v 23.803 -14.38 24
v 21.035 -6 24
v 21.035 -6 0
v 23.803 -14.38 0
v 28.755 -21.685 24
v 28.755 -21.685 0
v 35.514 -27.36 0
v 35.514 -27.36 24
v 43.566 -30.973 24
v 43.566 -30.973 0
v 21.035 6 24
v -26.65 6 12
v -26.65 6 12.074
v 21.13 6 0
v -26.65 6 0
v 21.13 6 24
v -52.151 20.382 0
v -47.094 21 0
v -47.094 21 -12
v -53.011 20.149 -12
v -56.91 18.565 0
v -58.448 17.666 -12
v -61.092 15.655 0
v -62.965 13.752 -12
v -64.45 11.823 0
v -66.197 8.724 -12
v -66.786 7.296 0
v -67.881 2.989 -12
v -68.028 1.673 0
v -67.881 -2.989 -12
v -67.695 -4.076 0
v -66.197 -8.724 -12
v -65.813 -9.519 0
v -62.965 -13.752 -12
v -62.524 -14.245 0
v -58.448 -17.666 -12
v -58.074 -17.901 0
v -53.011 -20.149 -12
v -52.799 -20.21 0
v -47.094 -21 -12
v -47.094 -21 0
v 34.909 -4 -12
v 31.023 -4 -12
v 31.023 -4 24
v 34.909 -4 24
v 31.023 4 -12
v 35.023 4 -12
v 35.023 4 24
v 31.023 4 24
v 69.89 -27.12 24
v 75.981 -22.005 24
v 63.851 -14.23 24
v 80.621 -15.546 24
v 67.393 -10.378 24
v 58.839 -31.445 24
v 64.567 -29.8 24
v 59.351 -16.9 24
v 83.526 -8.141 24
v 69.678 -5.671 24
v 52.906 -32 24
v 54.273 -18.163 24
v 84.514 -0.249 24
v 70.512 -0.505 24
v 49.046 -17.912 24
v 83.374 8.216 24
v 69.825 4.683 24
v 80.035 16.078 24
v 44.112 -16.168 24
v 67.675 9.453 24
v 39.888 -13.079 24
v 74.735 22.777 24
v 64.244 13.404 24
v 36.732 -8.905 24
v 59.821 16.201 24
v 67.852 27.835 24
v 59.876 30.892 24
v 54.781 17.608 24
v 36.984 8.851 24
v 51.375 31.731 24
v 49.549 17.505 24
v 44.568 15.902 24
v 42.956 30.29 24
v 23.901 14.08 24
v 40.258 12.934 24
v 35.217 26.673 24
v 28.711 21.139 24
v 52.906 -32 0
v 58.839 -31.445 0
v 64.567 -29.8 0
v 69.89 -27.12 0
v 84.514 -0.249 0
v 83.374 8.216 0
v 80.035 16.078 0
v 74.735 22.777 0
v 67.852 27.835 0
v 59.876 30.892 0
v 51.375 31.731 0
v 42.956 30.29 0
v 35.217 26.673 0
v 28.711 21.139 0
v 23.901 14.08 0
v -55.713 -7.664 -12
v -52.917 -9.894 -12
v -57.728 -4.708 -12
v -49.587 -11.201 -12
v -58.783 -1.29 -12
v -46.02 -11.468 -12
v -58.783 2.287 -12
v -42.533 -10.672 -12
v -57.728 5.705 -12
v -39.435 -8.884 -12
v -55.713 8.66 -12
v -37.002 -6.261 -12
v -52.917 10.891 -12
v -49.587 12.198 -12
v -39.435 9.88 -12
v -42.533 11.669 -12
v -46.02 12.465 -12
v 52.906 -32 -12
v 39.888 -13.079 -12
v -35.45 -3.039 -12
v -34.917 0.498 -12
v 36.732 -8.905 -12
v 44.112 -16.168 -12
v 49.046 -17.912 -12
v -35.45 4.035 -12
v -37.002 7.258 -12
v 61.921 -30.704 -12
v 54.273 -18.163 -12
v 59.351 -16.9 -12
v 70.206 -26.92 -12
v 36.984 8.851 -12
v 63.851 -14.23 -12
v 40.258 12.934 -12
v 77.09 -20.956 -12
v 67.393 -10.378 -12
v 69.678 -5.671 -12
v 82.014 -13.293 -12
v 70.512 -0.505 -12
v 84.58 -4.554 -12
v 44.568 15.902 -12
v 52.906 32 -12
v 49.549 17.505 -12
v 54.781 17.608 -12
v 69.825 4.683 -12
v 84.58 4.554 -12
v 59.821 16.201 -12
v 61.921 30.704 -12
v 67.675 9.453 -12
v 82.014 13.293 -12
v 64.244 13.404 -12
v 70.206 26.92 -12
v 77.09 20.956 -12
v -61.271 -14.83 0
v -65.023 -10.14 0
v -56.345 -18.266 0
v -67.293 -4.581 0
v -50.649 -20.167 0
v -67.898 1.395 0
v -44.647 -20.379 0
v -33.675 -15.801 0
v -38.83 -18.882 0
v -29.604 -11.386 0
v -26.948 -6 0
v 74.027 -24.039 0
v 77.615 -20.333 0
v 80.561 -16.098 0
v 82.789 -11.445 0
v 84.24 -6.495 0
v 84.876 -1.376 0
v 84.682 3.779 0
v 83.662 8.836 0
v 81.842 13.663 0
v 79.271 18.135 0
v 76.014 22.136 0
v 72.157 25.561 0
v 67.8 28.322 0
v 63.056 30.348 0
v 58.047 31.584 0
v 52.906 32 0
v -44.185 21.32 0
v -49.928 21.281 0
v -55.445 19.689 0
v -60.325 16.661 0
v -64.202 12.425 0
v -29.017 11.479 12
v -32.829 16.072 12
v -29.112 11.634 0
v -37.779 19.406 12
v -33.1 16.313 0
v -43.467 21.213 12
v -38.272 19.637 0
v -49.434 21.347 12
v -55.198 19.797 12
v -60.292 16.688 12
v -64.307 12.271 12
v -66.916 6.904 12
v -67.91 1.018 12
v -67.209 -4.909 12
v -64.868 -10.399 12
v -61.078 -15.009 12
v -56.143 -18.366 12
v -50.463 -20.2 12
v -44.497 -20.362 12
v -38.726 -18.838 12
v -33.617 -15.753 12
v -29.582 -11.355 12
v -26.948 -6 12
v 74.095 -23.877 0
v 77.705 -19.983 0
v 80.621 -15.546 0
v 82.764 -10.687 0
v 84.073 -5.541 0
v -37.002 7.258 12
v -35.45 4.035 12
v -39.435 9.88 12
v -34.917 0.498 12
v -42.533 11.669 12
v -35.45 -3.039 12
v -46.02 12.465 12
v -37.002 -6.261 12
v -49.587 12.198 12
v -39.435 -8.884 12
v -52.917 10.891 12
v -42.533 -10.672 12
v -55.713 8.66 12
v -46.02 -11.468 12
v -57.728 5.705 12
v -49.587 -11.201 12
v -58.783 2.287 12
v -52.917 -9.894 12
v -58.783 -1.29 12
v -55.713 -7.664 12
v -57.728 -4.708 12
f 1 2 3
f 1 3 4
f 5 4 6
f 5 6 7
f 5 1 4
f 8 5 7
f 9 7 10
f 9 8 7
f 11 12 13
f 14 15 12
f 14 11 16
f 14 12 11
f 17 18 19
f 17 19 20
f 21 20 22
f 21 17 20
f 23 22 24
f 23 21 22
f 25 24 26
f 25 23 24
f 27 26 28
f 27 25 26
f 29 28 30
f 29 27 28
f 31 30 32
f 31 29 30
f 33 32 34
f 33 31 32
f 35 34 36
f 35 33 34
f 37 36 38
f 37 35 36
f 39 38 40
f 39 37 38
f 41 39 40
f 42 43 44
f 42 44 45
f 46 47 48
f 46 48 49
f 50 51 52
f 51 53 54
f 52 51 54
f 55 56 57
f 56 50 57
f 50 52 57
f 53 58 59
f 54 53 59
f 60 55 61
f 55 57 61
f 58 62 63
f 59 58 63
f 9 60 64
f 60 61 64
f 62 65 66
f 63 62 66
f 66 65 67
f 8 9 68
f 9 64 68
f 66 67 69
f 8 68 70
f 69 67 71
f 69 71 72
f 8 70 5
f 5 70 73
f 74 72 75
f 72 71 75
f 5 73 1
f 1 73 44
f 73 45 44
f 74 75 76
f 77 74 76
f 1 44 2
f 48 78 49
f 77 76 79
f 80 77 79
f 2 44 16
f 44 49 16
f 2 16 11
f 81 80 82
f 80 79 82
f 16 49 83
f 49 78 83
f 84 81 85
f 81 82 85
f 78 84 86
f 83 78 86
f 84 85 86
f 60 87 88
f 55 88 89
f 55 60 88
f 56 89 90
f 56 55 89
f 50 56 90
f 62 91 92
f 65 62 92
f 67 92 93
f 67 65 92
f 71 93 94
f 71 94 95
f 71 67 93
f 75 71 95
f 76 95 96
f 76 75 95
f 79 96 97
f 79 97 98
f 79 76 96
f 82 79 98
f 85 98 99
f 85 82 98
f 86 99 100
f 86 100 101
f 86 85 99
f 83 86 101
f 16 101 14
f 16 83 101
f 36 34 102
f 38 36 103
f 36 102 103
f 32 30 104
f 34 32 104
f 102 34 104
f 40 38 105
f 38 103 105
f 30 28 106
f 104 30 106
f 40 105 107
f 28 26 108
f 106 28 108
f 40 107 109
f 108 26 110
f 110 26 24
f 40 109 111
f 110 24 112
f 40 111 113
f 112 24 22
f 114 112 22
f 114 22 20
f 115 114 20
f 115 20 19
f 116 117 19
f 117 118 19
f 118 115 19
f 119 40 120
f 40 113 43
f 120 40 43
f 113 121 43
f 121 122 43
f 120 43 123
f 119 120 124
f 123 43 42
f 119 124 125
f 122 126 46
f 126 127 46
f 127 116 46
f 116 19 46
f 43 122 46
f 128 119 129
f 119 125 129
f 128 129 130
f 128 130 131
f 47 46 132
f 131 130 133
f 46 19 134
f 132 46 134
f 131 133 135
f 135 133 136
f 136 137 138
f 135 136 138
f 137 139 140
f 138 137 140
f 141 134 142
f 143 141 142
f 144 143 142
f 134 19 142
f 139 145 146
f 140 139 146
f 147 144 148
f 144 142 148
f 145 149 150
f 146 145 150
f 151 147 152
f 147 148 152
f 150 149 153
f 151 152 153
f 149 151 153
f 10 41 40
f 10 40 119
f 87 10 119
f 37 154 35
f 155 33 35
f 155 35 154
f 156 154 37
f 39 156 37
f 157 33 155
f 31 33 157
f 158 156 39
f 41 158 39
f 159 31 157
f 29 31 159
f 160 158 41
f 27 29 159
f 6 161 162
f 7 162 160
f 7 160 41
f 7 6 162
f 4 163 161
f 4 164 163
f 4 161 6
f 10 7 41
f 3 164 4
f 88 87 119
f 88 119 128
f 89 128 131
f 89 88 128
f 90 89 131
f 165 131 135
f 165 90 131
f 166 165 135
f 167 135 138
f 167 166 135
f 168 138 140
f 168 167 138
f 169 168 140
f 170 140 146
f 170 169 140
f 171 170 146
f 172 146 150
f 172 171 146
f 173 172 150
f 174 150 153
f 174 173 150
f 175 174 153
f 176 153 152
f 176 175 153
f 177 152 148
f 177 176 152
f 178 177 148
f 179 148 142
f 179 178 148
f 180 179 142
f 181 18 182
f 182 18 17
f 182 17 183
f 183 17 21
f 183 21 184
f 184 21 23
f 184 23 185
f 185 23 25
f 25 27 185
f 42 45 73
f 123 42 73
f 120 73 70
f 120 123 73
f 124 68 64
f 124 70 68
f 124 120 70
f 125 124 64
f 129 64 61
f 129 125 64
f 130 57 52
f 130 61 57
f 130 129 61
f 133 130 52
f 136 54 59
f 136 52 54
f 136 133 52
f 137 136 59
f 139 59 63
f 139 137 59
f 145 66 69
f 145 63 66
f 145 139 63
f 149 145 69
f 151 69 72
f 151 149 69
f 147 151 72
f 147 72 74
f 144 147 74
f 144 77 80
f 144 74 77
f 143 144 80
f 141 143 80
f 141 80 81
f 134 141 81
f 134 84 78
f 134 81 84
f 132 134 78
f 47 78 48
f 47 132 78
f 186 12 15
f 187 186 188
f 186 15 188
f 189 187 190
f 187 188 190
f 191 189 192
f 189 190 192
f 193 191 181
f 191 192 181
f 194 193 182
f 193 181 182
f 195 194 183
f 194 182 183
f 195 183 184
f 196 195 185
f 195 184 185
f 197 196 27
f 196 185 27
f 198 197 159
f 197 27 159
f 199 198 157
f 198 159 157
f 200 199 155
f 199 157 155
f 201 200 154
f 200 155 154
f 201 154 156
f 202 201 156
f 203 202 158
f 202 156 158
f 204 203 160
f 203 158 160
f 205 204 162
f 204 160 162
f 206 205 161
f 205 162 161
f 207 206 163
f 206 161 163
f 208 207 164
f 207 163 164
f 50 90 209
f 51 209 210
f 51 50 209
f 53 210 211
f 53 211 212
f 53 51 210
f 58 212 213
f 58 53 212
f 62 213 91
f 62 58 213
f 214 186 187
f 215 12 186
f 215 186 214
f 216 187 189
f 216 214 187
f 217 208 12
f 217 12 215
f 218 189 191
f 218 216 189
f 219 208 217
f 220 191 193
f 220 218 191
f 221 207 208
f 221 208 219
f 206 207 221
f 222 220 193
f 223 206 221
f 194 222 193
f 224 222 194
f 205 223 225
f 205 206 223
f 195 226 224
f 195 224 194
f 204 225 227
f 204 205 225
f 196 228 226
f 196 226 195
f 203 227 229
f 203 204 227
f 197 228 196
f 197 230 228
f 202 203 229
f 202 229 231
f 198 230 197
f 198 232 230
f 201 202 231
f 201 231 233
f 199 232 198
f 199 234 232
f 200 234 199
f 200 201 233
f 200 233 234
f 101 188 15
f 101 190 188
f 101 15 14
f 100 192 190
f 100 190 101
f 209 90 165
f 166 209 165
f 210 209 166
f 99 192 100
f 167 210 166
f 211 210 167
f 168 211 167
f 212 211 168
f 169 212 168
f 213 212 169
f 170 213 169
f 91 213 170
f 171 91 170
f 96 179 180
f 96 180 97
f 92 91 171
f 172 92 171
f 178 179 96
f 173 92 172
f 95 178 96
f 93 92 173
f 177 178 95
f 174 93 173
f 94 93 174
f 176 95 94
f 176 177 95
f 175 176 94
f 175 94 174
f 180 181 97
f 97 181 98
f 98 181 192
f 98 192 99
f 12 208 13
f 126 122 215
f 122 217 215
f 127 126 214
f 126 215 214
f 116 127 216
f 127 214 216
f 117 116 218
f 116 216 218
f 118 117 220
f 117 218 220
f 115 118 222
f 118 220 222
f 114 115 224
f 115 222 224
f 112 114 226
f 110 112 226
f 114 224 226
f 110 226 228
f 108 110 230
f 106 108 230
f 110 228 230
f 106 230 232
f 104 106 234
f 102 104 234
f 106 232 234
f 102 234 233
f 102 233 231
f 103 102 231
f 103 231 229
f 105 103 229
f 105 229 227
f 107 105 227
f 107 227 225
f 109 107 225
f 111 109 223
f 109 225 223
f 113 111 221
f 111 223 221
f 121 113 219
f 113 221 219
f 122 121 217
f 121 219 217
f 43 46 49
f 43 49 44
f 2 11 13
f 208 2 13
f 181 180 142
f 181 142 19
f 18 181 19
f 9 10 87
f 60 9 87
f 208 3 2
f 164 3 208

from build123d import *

# Parameters (mm, degrees)
BOSS_EXTRUDE1_DEPTH     = 12
SKETCH7_R               = 21
BOSS_EXTRUDE3_DEPTH     = 12
BOSS_EXTRUDE4_START     = 24
BOSS_EXTRUDE4_DEPTH     = 24
SKETCH9_R               = 12
SKETCH9_R_2             = 18
CUT_EXTRUDE1_DEPTH      = 94.856036825
CUT_EXTRUDE2_DEPTH      = 94.856036825
CUT_EXTRUDE2_DEPTH_BACK = 94.856036825
SKETCH9_3_R             = 12
SKETCH9_3_R_2           = 18
CUT_EXTRUDE3_DEPTH      = 98.616369777
CUT_EXTRUDE3_DEPTH_BACK = 98.616369777
BOSS_EXTRUDE5_DEPTH     = 24
CUT_EXTRUDE4_DEPTH      = 97.067453638
CUT_EXTRUDE4_DEPTH_BACK = 24


with BuildPart() as part:
    # Sketch4 → Boss-Extrude1 (new body)
    with BuildSketch(Plane.XY):
        with BuildLine():
            ThreePointArc((-47.094430993, 21), (-68.094430993, 0), (-47.094430993, -21))
            Line((-47.094430993, -21), (52.905569007, -32))
            ThreePointArc((52.905569007, -32), (84.905569007, 0), (52.905569007, 32))
            Line((52.905569007, 32), (-47.094430993, 21))
        make_face()
    extrude(amount=-BOSS_EXTRUDE1_DEPTH)

    # Sketch7 → Boss-Extrude3 (add)
    with BuildSketch(Plane.XY):
        with Locations((-46.916866089, 0.498400316)):
            Circle(SKETCH7_R)
    extrude(amount=BOSS_EXTRUDE3_DEPTH)

    # Sketch7<4> → Boss-Extrude4 (add)
    with BuildSketch(Plane.XY.offset(BOSS_EXTRUDE4_START)):
        with BuildLine():
            ThreePointArc((69.890228484, -27.120496722), (80.621286149, -15.545614643), (84.513996989, -0.249200158))
            ThreePointArc((84.513996989, -0.249200158), (33.309113789, 25.347136714), (43.56571816, -30.972616407))
            Line((43.56571816, -30.972616407), (52.905569007, -32))
            ThreePointArc((52.905569007, -32), (61.741408099, -30.755941663), (69.890228484, -27.120496722))
        make_face()
    extrude(amount=-BOSS_EXTRUDE4_DEPTH)

    # Sketch9 → Cut-Extrude1 (cut, through all)
    with BuildSketch(Plane.XY):
        with Locations((-46.916866089, 0.498400316)):
            Circle(SKETCH9_R)
        with Locations((52.513996989, -0.249200158)):
            Circle(SKETCH9_R_2)
    extrude(amount=-CUT_EXTRUDE1_DEPTH, mode=Mode.SUBTRACT)

    # Sketch9<3> → Cut-Extrude2 (cut, two sides: drawn at the far end of the back side and taken through both)
    with BuildSketch(Plane.XY.offset(-CUT_EXTRUDE2_DEPTH_BACK)):
        with Locations((-46.916866089, 0.498400316)):
            Circle(SKETCH9_3_R)
        with Locations((52.513996989, -0.249200158)):
            Circle(SKETCH9_3_R_2)
    extrude(amount=CUT_EXTRUDE2_DEPTH + CUT_EXTRUDE2_DEPTH_BACK, mode=Mode.SUBTRACT)

    # Sketch10 → Cut-Extrude3 (cut, two sides: drawn at the far end of the back side and taken through both)
    with BuildSketch(Plane.XY.offset(24).offset(-CUT_EXTRUDE3_DEPTH_BACK)):
        Polygon((35.022733512, 4), (31.022733512, 4), (31.022733512, -4), (34.909125489, -4), align=None)
    extrude(amount=CUT_EXTRUDE3_DEPTH + CUT_EXTRUDE3_DEPTH_BACK, mode=Mode.SUBTRACT)

    # Sketch11 → Boss-Extrude5 (add)
    with BuildSketch(Plane.XY):
        Polygon((-26.650332075, 6), (21.130123784, 6), (21.034983326, -6), (-26.9476199, -6), align=None)
    extrude(amount=BOSS_EXTRUDE5_DEPTH)

    # Sketch12 → Cut-Extrude4 (cut, two sides: drawn at the far end of the back side and taken through both)
    with BuildSketch(Plane.XZ.offset(6).offset(-CUT_EXTRUDE4_DEPTH_BACK)):
        Polygon((-26.9476199, 12), (21.034983326, 24), (-26.9476199, 24), align=None)
    extrude(amount=CUT_EXTRUDE4_DEPTH + CUT_EXTRUDE4_DEPTH_BACK, mode=Mode.SUBTRACT)


solid = part.part
